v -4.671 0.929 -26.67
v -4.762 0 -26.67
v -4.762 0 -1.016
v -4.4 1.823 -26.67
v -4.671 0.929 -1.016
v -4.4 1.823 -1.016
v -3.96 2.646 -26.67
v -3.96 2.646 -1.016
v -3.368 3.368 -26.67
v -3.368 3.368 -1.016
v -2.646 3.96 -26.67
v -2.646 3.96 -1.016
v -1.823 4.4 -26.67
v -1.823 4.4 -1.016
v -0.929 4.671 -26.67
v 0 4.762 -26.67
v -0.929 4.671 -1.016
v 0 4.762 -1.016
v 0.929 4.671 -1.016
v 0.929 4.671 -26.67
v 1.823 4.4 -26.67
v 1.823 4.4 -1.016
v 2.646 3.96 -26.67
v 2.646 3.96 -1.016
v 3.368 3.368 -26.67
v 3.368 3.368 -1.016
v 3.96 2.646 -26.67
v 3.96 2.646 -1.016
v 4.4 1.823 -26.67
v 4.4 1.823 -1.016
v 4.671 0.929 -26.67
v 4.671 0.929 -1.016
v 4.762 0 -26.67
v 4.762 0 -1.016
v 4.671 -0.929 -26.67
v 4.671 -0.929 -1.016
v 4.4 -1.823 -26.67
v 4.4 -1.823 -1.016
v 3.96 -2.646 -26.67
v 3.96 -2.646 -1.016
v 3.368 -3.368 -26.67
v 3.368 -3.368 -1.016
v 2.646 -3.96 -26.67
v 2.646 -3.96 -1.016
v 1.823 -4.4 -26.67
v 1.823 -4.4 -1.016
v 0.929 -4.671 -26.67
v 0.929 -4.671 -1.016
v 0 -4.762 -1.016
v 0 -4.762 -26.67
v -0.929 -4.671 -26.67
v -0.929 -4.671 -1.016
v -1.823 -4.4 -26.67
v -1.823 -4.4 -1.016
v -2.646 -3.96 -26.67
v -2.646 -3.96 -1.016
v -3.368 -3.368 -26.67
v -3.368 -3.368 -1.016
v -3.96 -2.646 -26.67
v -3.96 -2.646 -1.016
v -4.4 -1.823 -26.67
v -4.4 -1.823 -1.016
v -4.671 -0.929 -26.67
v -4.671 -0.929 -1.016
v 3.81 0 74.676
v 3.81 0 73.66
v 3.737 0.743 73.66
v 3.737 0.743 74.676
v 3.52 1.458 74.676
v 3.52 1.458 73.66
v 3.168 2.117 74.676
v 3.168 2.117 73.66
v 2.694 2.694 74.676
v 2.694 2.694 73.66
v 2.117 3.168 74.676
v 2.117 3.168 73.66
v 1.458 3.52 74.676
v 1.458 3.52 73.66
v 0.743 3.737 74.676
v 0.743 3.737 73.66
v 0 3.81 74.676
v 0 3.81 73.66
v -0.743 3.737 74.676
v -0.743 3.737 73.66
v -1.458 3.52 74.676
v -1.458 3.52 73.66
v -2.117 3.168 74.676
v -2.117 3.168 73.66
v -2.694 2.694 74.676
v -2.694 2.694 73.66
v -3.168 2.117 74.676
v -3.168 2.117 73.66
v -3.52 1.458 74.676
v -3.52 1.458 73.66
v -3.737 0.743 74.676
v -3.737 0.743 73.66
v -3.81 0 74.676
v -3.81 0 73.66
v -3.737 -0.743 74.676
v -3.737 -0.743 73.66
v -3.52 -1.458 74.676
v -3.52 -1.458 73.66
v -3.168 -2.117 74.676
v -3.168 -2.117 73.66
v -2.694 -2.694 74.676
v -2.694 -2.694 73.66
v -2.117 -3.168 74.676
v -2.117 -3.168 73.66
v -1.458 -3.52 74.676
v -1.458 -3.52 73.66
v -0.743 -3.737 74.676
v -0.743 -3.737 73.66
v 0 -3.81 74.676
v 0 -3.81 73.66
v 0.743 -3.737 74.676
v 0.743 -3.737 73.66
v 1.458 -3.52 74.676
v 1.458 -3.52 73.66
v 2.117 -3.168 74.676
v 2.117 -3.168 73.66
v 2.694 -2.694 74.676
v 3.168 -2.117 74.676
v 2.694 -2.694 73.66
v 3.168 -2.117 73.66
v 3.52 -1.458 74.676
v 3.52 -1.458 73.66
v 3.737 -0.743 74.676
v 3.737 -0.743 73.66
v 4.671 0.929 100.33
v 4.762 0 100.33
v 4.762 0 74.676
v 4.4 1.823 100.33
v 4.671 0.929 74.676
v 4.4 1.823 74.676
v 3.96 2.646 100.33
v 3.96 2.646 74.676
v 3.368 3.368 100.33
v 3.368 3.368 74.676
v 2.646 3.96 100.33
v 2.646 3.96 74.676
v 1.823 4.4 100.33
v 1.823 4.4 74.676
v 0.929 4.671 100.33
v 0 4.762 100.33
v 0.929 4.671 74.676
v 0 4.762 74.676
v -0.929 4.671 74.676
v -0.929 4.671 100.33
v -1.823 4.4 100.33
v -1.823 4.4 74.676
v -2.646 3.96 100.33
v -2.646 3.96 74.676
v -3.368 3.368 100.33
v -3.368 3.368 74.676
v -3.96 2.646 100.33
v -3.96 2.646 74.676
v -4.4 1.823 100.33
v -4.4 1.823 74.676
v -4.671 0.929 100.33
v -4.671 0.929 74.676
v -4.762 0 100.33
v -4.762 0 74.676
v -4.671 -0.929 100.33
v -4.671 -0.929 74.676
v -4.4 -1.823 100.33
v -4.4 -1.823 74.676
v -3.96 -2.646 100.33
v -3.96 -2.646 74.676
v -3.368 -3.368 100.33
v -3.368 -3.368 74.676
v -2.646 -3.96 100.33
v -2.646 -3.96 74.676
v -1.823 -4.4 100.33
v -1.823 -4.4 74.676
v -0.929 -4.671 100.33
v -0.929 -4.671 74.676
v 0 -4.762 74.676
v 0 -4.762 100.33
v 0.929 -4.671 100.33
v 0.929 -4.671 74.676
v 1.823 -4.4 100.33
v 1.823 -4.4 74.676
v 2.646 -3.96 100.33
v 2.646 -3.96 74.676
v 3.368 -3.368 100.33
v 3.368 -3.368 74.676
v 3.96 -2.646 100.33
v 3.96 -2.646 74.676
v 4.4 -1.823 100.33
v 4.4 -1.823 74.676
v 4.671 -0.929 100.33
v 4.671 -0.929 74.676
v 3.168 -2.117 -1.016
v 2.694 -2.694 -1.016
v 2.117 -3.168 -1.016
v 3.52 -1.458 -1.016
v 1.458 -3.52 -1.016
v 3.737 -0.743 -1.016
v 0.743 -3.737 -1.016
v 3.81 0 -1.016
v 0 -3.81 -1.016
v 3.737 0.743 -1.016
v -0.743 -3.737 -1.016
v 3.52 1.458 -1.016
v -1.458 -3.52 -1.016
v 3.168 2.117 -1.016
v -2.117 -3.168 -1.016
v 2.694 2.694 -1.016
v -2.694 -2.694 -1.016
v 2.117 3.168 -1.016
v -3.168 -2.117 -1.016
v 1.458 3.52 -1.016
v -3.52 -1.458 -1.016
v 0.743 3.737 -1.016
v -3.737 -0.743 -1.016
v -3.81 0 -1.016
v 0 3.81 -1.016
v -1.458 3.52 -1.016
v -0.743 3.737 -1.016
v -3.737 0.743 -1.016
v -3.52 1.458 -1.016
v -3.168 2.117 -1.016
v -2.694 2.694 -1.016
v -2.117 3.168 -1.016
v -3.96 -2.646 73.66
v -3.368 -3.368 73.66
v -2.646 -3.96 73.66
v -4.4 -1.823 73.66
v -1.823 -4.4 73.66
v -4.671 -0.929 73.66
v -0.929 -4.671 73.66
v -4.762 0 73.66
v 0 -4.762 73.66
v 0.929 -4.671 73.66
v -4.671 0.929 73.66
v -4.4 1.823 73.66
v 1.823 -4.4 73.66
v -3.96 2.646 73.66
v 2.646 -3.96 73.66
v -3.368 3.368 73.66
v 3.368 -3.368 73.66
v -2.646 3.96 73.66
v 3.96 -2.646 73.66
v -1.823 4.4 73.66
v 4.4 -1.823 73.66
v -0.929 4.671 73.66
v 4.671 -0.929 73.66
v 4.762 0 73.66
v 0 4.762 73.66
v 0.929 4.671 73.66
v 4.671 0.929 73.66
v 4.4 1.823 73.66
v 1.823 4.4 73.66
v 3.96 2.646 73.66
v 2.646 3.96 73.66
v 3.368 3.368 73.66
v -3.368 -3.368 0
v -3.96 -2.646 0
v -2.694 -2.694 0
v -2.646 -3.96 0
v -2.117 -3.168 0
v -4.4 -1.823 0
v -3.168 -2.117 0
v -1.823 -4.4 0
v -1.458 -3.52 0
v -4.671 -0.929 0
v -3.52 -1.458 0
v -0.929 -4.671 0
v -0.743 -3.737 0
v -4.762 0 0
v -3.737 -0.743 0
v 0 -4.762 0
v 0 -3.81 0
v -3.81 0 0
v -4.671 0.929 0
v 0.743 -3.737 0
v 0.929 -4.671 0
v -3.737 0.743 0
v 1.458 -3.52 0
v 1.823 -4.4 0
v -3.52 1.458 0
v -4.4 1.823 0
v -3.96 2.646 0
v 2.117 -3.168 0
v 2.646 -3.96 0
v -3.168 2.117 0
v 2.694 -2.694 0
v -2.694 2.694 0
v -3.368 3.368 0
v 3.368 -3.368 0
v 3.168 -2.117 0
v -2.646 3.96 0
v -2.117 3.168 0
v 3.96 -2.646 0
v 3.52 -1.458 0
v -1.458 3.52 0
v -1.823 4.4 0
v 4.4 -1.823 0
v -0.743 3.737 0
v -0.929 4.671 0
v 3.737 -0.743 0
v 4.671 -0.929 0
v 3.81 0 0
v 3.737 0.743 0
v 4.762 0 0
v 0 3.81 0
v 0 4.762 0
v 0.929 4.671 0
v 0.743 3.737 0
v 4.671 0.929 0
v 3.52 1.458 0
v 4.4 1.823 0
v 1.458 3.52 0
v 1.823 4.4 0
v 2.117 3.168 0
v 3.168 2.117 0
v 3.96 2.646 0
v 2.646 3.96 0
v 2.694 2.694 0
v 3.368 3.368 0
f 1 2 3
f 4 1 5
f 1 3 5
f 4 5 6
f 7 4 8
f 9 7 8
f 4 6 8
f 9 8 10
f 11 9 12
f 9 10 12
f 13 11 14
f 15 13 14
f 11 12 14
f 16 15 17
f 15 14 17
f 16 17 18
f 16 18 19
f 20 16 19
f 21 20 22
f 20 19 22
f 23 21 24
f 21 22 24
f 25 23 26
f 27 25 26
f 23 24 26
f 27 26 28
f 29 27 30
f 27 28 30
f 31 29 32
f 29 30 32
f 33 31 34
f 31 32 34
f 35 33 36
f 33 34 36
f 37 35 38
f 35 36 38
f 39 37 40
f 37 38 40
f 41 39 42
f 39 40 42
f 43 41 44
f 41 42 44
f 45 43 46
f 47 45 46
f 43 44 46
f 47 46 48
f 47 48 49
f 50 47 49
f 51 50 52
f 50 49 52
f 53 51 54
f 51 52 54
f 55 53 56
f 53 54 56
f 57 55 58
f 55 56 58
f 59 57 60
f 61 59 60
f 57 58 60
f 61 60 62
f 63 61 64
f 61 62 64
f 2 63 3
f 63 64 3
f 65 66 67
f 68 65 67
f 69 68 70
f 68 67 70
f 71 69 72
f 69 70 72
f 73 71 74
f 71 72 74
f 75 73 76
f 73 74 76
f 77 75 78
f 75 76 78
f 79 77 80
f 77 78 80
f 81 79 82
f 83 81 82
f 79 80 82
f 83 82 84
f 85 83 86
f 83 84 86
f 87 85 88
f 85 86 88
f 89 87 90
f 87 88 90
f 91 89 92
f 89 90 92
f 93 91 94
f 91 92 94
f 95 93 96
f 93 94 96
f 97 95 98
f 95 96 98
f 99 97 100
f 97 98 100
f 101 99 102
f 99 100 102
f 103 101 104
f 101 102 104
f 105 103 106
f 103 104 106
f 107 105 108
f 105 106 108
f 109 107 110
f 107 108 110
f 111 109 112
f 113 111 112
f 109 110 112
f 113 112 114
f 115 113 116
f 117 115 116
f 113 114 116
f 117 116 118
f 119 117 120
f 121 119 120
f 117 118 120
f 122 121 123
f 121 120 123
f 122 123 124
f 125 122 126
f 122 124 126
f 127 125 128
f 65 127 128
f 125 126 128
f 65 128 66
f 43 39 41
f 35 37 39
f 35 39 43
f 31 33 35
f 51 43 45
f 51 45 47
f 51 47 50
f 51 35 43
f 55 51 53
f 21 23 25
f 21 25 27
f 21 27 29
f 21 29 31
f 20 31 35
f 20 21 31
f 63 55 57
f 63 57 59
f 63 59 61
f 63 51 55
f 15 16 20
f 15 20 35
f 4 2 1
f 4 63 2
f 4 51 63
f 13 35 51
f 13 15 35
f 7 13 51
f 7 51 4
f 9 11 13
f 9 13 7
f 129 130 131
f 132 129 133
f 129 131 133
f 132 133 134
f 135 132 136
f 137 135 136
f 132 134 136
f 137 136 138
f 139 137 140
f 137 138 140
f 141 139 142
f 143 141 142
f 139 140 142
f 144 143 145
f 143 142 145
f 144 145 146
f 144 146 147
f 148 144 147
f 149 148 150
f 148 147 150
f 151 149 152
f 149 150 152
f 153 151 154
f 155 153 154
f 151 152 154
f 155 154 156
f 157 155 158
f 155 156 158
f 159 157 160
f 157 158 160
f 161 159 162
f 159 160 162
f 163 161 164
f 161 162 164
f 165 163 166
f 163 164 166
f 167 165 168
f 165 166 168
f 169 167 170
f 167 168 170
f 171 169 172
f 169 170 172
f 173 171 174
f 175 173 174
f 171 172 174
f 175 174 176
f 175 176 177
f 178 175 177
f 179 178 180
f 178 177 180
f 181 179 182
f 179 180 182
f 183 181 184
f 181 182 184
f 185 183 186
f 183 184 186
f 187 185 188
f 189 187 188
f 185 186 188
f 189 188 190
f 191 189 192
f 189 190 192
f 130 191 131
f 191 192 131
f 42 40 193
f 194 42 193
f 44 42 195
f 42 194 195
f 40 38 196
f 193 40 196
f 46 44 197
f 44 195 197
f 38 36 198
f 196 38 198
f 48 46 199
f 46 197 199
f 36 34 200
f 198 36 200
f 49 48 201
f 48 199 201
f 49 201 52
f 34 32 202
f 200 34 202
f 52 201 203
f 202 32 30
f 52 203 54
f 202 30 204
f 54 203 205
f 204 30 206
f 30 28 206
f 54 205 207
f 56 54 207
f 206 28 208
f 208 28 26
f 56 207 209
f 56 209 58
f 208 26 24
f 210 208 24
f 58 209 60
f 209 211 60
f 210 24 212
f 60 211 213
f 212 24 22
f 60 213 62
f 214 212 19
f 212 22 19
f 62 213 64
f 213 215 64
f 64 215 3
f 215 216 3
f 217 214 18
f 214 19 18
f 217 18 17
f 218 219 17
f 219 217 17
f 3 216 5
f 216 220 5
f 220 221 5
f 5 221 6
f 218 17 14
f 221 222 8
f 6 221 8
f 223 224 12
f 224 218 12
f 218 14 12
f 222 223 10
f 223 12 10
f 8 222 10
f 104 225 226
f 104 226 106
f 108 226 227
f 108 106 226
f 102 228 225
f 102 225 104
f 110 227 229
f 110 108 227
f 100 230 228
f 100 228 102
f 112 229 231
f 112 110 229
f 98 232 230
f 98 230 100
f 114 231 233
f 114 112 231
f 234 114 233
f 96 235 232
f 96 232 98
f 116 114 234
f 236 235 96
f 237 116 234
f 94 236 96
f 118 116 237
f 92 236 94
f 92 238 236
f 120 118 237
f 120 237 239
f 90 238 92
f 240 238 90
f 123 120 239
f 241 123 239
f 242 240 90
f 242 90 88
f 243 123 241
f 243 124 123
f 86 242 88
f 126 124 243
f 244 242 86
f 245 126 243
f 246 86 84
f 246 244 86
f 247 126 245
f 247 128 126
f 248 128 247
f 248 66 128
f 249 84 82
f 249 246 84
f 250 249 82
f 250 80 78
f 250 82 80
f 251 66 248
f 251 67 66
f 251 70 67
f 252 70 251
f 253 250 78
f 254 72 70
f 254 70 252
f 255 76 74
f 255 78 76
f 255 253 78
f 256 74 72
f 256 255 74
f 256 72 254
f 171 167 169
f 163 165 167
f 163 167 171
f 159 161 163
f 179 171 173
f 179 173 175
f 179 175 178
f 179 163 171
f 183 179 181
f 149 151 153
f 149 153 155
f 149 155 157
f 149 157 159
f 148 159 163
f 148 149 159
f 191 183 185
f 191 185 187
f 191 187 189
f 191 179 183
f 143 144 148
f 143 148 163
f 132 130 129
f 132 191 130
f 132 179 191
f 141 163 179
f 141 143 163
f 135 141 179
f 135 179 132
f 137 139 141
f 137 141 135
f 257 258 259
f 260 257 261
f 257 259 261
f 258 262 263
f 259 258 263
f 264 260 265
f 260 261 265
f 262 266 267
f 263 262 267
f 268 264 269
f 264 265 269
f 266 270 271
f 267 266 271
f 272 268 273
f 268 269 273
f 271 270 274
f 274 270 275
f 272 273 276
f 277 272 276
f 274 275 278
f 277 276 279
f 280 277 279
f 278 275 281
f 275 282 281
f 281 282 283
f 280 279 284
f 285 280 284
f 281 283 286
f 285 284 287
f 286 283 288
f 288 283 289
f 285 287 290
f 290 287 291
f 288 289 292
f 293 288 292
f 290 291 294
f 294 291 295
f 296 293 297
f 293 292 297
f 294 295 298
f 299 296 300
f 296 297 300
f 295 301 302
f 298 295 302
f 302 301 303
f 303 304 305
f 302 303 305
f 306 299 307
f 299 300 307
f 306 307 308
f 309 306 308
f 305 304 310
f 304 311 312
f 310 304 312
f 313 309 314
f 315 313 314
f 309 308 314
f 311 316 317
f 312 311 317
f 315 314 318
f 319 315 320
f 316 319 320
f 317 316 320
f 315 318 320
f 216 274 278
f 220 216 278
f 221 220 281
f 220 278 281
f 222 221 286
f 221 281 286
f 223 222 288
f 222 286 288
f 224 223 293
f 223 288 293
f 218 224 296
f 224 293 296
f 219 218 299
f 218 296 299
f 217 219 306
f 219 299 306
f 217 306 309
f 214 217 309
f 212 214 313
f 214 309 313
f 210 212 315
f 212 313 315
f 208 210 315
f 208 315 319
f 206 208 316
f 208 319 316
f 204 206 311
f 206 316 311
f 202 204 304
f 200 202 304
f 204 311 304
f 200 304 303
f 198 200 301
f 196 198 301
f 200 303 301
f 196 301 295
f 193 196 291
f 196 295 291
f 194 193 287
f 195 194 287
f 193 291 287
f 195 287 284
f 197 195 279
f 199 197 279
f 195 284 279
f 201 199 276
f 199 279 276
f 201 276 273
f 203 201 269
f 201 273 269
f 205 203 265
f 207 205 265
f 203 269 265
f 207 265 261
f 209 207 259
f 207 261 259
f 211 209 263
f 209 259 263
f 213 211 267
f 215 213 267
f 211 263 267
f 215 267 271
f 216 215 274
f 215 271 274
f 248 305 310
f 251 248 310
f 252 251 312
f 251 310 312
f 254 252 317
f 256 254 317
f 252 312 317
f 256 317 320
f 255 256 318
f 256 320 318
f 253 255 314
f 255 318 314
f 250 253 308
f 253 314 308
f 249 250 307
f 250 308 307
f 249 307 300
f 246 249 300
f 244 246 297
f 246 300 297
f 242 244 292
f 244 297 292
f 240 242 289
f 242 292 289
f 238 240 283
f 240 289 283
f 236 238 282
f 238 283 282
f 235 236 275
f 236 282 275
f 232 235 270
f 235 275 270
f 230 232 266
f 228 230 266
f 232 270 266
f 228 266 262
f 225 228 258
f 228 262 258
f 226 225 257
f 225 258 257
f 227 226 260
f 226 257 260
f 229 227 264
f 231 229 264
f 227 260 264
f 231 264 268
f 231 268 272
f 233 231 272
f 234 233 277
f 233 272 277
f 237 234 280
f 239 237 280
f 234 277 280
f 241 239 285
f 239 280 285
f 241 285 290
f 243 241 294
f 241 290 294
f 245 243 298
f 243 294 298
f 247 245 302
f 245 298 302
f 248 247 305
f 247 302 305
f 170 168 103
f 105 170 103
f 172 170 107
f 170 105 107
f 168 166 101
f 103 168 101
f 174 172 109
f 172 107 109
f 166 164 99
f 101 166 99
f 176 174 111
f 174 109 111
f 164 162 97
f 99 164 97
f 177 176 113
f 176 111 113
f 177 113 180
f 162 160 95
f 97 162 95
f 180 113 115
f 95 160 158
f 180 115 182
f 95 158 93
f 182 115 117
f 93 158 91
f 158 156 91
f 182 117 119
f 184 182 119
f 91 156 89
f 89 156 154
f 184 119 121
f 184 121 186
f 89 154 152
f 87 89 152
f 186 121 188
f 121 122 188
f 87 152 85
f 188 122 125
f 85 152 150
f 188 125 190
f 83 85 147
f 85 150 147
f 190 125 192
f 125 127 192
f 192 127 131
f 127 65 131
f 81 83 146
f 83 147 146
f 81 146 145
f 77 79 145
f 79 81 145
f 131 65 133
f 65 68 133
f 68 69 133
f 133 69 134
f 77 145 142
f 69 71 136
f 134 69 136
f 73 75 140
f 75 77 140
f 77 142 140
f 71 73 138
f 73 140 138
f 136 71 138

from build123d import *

# Parameters (mm, degrees)
SKETCH1_R           = 4.7625
BOSS_EXTRUDE1_DEPTH = 73.66
SKETCH2_R           = 3.81
BOSS_EXTRUDE2_DEPTH = 1.016
SKETCH3_R           = 4.7625
BOSS_EXTRUDE3_DEPTH = 25.654
SKETCH4_R           = 3.81
BOSS_EXTRUDE4_DEPTH = 1.016
SKETCH5_R           = 4.7625
BOSS_EXTRUDE5_DEPTH = 25.654


with BuildPart() as part:
    # Sketch1 → Boss-Extrude1 (new body)
    with BuildSketch(Plane.XY):
        Circle(SKETCH1_R)
    extrude(amount=BOSS_EXTRUDE1_DEPTH)

    # Sketch2 → Boss-Extrude2 (add)
    with BuildSketch(Plane(origin=(0, 0, 0), x_dir=(-1, 0, 0), z_dir=(0, 0, -1))):
        Circle(SKETCH2_R)
    extrude(amount=BOSS_EXTRUDE2_DEPTH)

    # Sketch3 → Boss-Extrude3 (add)
    with BuildSketch(Plane(origin=(0, 0, -1.016), x_dir=(-1, 0, 0), z_dir=(0, 0, -1))):
        Circle(SKETCH3_R)
    extrude(amount=BOSS_EXTRUDE3_DEPTH)

    # Sketch4 → Boss-Extrude4 (add)
    with BuildSketch(Plane.XY.offset(73.66)):
        Circle(SKETCH4_R)
    extrude(amount=BOSS_EXTRUDE4_DEPTH)

    # Sketch5 → Boss-Extrude5 (add)
    with BuildSketch(Plane.XY.offset(74.676)):
        Circle(SKETCH5_R)
    extrude(amount=BOSS_EXTRUDE5_DEPTH)


solid = part.part
